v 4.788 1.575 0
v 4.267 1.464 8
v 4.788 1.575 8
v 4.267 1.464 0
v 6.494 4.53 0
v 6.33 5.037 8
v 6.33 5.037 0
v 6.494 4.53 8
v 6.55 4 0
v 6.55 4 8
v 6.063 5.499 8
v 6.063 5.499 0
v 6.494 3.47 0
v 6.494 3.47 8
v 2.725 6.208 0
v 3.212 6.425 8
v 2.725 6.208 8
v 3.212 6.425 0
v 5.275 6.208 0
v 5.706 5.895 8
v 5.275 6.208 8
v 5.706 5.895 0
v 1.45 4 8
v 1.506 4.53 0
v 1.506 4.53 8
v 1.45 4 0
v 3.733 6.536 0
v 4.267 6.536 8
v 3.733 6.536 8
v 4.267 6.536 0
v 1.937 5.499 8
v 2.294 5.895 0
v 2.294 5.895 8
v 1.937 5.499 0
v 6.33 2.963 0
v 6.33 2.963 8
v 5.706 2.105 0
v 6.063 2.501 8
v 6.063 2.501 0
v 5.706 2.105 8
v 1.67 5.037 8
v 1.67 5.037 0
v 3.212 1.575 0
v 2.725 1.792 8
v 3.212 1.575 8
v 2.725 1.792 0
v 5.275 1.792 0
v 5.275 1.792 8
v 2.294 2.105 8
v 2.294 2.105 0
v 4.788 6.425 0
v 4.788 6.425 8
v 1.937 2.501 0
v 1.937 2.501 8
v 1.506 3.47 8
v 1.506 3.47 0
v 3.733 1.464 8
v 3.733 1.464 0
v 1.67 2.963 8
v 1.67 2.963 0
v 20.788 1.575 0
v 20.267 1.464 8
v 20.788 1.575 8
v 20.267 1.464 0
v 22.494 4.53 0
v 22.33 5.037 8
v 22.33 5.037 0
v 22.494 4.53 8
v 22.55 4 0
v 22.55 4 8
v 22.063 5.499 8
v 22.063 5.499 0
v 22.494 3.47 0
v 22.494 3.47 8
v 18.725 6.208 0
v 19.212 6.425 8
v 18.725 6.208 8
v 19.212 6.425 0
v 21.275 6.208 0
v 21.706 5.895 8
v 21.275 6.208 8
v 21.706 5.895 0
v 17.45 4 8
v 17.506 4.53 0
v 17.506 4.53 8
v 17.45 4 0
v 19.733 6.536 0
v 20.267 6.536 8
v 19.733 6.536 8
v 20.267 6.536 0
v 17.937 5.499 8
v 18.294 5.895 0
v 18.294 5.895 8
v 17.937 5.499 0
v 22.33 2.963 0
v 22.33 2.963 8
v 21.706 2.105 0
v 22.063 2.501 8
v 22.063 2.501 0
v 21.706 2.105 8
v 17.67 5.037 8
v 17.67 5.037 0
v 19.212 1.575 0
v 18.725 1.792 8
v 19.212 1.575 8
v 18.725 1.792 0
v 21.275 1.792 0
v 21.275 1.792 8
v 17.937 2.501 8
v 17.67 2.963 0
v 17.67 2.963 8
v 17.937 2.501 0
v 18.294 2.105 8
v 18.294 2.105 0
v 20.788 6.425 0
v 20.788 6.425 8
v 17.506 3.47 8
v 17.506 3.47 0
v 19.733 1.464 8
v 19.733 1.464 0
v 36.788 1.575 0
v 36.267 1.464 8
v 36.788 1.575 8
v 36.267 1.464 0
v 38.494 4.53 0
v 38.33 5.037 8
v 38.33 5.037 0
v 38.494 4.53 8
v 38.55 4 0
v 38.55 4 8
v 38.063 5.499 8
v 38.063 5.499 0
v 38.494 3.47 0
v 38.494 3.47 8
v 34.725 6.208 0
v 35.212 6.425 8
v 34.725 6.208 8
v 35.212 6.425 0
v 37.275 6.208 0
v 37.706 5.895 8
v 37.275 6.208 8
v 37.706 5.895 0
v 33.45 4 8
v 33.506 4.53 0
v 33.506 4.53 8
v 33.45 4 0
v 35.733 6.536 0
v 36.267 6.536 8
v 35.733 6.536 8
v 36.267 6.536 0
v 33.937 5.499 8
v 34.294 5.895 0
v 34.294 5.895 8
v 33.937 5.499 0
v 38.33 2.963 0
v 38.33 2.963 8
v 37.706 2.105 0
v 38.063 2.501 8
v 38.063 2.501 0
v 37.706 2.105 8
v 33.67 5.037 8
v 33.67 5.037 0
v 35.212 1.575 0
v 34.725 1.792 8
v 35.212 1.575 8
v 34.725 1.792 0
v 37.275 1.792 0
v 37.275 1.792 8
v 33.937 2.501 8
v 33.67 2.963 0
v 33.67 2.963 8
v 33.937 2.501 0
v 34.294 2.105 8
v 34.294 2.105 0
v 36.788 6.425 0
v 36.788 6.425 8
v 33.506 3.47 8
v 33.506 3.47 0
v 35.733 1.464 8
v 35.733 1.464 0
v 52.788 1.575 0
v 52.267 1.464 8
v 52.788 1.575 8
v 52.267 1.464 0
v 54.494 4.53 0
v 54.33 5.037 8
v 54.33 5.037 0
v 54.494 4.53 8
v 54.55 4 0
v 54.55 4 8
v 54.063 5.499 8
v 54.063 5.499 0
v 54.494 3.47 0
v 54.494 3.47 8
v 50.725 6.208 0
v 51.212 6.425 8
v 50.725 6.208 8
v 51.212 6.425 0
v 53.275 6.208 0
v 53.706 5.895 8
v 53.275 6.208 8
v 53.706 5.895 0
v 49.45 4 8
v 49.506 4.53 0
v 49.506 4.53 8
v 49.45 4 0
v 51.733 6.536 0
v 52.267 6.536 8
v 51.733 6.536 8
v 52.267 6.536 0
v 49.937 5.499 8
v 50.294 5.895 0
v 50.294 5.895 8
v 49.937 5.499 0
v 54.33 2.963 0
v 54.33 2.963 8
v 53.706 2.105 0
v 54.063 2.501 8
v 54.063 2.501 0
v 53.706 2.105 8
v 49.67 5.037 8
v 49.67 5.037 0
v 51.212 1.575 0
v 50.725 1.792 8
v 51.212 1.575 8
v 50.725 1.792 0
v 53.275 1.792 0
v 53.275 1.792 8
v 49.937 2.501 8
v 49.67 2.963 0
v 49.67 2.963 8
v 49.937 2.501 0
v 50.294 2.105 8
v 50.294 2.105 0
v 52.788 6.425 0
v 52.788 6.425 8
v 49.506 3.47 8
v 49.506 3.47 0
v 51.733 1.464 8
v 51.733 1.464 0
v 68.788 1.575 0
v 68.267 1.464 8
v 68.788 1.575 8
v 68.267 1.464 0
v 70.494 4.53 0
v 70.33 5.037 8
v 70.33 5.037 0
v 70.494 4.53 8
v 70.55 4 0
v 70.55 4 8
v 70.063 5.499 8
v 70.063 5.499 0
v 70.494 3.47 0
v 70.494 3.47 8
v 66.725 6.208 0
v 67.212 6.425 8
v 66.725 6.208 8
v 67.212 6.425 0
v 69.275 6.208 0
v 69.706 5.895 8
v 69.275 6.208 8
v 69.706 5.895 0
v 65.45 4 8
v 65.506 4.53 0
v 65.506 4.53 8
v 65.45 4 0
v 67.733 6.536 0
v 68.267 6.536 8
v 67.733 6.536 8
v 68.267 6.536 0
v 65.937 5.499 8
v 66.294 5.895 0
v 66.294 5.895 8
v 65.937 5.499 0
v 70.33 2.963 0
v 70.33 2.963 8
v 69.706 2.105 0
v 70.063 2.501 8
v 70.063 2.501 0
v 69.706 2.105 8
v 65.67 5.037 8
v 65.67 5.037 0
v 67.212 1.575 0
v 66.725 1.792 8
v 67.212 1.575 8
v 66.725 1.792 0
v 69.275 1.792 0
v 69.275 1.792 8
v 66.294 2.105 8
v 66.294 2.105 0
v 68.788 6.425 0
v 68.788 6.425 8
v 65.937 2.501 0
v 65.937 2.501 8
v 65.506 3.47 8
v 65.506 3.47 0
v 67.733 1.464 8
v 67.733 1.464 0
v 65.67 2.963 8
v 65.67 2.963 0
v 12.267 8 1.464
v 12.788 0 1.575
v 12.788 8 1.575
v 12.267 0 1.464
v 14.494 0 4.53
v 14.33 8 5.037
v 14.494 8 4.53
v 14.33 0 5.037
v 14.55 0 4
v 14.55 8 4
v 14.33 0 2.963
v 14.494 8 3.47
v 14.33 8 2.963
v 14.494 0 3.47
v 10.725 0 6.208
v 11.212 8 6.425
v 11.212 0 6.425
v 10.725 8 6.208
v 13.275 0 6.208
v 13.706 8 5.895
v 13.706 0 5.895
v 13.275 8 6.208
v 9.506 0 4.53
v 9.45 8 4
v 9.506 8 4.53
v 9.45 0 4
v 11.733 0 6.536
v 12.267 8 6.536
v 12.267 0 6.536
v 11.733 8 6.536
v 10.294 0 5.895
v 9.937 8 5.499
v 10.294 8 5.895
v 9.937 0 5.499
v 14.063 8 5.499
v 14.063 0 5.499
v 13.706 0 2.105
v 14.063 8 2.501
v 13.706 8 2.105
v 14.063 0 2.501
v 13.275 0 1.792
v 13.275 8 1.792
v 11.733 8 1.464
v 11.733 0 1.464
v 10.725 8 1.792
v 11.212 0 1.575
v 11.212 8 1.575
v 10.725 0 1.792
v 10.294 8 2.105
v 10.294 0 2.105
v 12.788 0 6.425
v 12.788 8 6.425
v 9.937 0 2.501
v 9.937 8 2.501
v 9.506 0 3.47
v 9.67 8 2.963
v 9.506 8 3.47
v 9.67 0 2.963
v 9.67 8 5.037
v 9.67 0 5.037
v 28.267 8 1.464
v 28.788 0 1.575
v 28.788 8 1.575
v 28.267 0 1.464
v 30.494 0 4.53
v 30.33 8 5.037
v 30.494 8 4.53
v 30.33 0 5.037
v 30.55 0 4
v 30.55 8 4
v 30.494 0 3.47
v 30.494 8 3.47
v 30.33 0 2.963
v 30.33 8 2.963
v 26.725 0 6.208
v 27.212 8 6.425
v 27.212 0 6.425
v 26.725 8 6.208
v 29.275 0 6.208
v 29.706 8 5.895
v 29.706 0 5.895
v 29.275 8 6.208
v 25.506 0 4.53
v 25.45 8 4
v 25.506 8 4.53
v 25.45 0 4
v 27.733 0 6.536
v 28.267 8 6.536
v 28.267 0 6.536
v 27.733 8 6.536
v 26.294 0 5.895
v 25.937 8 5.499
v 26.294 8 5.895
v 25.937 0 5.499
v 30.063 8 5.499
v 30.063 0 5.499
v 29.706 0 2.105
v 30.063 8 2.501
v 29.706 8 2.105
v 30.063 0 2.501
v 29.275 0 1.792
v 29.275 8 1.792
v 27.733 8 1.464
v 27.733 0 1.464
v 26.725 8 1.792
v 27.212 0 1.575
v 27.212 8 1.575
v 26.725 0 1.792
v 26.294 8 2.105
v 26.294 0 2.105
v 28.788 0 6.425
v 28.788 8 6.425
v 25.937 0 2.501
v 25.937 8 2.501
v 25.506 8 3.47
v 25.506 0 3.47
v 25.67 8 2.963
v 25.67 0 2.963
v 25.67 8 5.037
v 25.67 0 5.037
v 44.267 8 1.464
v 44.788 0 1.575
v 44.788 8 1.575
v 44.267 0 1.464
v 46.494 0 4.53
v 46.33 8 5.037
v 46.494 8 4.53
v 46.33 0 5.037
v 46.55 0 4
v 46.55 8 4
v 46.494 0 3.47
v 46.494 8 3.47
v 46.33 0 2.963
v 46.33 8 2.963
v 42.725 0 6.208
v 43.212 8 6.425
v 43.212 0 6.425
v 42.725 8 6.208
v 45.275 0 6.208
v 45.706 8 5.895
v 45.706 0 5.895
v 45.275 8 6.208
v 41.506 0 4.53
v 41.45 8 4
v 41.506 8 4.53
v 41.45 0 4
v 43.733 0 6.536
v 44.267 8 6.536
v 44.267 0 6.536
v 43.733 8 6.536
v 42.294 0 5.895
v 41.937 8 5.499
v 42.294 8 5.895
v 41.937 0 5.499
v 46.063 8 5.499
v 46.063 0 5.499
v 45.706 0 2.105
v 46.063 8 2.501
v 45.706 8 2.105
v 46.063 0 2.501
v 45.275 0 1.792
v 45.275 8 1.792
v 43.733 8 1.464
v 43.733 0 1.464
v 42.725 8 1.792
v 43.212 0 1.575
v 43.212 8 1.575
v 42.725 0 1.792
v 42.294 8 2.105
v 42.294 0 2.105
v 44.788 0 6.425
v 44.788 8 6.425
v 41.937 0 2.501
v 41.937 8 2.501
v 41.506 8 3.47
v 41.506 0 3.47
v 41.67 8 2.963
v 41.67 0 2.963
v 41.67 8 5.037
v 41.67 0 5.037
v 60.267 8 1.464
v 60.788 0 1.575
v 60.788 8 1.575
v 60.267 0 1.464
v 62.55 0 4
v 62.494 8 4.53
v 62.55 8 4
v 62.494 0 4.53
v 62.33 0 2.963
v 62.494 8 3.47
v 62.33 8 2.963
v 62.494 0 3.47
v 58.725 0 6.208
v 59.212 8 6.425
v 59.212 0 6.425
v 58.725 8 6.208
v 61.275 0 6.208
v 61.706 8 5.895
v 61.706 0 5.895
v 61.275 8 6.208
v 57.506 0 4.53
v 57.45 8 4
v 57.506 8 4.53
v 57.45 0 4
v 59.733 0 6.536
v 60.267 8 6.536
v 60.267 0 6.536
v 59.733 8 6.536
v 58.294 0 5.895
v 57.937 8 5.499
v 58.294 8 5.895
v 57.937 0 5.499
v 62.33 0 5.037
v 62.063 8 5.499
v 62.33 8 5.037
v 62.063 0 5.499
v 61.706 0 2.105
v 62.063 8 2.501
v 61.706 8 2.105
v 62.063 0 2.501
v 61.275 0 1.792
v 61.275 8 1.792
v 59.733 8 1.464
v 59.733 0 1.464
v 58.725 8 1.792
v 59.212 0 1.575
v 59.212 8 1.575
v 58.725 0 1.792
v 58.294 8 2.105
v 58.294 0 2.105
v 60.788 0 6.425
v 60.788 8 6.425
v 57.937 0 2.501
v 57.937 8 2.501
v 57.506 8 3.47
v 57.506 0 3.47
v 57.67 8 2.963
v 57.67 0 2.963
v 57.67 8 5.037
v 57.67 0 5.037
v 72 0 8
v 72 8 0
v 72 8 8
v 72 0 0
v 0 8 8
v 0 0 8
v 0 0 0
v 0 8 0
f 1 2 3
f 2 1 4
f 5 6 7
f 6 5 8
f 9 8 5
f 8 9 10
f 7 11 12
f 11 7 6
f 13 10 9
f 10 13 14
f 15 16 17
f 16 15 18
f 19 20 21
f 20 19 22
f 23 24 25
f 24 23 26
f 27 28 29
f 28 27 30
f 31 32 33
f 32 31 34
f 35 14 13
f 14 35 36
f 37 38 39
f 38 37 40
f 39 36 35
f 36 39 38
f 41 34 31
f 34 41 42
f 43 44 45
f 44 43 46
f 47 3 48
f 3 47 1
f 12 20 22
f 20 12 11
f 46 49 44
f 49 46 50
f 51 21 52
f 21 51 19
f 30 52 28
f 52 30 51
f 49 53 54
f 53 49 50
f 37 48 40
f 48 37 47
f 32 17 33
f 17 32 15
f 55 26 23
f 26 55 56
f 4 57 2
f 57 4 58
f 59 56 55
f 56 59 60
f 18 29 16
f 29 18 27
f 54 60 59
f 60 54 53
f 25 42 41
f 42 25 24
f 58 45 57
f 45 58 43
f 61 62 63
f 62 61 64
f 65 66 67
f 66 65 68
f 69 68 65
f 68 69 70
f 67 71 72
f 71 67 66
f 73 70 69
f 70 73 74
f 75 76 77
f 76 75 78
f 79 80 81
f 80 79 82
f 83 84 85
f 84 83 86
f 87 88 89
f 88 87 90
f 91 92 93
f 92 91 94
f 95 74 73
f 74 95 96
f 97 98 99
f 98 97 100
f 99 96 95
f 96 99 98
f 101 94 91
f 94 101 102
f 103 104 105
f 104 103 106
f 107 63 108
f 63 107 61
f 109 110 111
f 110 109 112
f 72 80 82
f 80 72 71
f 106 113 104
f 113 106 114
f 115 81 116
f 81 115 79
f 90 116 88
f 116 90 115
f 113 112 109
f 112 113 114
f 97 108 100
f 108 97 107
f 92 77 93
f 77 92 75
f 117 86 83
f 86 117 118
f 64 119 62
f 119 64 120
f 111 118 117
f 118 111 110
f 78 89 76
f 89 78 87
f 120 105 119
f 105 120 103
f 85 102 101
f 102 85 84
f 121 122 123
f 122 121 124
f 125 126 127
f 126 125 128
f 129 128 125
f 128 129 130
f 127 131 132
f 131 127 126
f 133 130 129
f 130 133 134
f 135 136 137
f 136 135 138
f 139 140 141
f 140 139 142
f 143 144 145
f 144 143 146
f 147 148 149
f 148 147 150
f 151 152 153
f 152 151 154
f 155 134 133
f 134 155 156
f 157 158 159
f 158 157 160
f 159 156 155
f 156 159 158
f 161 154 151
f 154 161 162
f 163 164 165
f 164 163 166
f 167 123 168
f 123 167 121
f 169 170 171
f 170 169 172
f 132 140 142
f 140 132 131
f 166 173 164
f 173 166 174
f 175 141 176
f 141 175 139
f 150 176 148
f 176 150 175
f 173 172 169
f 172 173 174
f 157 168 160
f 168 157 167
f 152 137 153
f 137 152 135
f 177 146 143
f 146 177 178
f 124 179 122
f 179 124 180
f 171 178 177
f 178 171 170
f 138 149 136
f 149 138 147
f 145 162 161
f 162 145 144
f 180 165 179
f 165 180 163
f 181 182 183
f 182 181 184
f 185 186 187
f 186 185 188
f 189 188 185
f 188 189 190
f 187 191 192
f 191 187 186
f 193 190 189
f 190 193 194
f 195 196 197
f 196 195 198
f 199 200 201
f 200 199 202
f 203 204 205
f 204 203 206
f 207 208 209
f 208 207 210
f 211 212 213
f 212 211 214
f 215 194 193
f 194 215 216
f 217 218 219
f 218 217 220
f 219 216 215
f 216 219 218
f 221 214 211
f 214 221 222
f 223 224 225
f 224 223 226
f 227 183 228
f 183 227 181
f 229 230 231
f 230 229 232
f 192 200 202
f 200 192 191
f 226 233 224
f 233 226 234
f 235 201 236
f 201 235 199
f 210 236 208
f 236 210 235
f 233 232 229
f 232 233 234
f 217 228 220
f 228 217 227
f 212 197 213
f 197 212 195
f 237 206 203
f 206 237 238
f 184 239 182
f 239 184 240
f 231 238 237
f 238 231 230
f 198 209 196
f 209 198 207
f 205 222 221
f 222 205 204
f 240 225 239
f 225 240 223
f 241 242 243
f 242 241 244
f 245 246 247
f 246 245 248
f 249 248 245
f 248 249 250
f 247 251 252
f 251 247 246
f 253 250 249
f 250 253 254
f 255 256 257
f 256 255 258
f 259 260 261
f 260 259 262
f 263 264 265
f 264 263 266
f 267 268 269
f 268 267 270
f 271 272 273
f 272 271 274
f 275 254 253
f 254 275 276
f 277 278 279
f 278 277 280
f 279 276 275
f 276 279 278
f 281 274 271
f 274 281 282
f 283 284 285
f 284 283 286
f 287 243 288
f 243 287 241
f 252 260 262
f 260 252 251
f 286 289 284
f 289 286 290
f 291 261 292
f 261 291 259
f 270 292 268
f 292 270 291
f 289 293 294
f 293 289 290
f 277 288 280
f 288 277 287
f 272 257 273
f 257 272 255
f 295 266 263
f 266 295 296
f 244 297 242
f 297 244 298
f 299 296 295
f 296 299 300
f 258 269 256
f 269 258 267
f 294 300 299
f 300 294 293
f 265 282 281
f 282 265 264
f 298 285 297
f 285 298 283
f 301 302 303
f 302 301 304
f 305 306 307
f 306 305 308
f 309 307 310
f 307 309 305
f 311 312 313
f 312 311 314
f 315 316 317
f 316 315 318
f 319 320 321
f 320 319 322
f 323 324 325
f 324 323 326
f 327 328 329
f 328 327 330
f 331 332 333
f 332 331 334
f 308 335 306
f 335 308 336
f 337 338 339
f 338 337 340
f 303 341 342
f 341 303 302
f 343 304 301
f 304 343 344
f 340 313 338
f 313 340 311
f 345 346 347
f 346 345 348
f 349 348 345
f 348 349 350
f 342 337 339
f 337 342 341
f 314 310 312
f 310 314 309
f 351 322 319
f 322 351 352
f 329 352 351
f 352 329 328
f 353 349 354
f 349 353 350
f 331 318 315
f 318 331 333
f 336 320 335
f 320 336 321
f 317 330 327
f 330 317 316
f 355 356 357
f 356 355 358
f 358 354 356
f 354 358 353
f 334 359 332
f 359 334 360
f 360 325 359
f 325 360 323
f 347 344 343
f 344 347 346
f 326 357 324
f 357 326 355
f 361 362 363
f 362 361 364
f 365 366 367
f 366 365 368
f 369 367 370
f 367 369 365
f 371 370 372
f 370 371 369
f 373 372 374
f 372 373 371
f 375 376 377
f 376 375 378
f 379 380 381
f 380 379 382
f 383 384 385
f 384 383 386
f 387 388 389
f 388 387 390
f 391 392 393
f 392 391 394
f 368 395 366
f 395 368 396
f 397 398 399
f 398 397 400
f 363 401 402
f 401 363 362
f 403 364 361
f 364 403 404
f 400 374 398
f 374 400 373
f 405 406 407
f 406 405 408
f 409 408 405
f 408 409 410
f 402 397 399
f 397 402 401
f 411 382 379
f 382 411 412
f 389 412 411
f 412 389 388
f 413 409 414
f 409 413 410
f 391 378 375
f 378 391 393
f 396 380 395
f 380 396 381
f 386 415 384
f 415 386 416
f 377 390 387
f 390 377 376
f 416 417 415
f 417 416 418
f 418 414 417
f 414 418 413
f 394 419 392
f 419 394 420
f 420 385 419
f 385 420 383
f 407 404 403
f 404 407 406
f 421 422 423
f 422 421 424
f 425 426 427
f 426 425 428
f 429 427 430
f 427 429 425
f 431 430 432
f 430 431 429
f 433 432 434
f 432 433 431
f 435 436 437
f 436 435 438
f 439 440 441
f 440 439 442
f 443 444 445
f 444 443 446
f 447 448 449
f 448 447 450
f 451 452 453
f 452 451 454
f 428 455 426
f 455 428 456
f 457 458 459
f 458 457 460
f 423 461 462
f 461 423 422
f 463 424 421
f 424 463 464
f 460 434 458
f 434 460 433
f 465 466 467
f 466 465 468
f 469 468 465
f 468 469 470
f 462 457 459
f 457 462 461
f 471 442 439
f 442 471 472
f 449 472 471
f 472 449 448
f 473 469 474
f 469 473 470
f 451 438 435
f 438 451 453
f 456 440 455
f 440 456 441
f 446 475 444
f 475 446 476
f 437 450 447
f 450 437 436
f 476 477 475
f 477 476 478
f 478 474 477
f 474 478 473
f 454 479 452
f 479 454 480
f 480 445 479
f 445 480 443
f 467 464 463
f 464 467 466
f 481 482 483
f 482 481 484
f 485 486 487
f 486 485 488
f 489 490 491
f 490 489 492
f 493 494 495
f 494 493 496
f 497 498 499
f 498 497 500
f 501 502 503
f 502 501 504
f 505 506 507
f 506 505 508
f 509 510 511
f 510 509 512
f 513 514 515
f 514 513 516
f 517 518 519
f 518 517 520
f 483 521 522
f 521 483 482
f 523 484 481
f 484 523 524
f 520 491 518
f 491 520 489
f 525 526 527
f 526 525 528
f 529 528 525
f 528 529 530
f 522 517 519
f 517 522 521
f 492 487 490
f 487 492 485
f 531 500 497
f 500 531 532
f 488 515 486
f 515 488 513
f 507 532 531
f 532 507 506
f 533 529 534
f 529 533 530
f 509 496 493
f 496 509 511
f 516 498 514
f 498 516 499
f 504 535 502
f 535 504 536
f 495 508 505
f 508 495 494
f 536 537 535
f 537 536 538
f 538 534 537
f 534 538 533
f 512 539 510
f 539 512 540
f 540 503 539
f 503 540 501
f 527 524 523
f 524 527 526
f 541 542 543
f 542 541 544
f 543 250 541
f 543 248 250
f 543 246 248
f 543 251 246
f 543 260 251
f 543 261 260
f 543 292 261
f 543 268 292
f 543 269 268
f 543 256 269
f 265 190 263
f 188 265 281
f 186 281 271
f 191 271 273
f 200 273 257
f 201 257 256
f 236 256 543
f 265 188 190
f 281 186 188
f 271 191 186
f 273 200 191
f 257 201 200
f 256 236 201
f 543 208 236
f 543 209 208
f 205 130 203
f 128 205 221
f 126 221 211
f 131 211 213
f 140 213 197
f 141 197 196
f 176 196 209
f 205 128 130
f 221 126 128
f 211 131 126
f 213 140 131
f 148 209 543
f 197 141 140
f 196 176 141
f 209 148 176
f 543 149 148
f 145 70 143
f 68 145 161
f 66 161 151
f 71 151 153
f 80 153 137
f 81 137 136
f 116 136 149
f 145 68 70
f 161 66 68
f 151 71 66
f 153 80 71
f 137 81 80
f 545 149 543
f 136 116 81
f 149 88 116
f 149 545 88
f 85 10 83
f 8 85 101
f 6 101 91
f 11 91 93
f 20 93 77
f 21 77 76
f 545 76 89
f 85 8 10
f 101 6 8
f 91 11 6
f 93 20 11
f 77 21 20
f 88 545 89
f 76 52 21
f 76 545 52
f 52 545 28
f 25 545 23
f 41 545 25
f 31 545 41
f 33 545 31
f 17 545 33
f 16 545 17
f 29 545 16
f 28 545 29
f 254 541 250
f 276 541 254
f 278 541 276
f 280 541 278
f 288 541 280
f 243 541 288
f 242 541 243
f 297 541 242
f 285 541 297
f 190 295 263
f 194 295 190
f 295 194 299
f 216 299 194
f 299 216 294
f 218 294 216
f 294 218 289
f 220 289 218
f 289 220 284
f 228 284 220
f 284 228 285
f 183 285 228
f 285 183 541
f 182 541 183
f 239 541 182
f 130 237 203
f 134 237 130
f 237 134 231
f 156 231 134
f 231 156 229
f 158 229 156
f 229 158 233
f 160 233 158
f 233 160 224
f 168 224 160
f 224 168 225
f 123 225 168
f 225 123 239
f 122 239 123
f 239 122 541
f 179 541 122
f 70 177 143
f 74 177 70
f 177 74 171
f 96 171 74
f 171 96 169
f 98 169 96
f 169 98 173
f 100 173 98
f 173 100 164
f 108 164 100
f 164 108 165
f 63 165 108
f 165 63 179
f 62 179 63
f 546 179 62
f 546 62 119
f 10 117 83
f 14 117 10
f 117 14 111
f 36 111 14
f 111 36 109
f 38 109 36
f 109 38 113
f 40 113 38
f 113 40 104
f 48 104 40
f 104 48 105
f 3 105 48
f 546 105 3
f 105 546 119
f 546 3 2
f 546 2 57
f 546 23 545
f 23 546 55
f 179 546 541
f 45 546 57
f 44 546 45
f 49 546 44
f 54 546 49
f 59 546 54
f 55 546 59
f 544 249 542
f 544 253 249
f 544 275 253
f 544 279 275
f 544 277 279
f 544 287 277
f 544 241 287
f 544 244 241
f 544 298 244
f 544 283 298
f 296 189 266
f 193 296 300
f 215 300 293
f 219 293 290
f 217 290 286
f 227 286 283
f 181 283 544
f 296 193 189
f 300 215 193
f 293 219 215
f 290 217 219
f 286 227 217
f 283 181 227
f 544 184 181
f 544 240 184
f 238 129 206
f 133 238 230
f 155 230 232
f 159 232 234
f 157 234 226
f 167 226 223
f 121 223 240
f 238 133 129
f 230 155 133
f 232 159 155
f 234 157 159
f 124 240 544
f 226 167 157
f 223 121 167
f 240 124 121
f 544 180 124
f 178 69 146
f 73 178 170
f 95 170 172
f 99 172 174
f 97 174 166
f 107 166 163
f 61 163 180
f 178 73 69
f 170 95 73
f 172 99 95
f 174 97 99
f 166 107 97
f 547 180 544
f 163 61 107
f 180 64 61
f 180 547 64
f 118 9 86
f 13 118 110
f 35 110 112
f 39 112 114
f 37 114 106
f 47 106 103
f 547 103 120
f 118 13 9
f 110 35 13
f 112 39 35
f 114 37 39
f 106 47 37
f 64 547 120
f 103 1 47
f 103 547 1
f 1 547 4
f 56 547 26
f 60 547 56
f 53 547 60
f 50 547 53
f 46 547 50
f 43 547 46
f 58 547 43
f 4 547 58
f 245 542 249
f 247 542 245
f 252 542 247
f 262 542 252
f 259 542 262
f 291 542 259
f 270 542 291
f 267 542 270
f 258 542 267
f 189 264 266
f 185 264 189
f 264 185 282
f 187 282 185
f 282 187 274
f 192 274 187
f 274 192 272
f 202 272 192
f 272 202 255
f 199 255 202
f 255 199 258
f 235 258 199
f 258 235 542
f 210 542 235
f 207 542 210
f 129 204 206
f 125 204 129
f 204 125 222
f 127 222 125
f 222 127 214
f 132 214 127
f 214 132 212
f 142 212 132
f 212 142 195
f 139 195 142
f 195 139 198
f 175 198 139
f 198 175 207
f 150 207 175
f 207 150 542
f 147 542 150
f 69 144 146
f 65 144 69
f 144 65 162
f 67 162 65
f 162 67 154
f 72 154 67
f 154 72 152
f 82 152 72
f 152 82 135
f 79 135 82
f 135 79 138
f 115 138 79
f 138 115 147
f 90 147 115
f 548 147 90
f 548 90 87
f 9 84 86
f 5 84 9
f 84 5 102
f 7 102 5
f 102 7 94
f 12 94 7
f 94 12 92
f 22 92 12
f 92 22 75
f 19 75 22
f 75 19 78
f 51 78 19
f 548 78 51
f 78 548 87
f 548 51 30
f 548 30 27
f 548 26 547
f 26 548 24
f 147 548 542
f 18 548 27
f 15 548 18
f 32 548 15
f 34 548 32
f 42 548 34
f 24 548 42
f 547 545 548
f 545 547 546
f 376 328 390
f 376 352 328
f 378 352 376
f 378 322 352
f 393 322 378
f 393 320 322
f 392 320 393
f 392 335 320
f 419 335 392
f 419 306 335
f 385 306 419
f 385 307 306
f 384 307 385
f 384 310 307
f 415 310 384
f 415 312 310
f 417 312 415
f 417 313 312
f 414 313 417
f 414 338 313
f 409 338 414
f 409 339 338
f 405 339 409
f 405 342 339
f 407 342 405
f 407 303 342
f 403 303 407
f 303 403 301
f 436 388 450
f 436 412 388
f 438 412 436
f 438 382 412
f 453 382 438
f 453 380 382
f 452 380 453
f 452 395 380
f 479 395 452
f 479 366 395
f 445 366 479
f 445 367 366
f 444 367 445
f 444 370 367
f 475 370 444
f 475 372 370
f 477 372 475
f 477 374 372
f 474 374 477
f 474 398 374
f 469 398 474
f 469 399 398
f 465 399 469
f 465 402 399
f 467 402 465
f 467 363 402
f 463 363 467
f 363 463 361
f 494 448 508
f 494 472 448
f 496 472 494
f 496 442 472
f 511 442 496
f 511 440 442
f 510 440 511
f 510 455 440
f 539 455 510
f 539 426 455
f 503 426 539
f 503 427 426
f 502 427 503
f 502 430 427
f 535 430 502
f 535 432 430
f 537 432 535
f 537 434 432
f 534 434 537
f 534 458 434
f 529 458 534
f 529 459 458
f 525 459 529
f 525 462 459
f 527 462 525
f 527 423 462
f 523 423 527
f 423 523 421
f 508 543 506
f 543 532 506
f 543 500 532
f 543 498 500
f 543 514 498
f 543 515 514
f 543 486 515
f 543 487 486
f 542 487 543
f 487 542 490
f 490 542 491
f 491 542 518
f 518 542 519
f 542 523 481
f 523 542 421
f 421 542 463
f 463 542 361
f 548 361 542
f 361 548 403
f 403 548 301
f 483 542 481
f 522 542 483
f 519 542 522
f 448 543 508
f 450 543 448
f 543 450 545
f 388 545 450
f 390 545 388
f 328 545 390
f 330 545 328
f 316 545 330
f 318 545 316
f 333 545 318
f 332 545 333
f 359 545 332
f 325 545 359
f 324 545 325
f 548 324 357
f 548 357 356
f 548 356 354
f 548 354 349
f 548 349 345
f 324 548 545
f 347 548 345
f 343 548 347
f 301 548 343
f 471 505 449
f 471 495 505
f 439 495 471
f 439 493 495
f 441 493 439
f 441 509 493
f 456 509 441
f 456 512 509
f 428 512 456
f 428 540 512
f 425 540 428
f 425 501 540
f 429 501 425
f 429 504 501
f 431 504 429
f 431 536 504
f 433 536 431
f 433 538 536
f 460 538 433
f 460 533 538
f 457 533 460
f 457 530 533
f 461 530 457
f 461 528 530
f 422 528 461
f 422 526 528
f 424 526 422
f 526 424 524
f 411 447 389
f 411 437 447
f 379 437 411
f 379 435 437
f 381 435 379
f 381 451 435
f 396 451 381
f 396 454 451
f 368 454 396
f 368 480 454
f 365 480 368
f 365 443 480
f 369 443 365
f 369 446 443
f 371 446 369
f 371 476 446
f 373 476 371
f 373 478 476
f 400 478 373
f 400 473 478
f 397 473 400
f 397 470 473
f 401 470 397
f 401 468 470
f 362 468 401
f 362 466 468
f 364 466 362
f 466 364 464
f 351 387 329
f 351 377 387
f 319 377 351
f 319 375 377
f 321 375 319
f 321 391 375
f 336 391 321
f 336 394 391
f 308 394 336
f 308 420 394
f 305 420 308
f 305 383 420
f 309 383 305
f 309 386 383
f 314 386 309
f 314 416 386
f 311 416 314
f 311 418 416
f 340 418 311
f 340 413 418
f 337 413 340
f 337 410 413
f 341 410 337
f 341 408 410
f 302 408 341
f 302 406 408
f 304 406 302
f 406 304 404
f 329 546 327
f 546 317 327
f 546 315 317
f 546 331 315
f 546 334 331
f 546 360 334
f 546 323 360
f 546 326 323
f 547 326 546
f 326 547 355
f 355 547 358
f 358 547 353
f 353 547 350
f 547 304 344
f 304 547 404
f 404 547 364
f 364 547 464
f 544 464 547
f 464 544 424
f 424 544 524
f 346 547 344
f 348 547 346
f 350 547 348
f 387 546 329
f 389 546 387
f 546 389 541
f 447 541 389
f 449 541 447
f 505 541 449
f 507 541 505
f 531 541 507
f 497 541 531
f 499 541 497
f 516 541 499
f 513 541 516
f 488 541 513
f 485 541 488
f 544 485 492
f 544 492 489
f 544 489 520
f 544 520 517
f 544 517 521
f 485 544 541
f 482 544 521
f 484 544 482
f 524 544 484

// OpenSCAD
// Description: "LEGO Technic-compatible gridbeam"
// Project home: http://bitbeam.org

// Each bitbeam is 8mm inches wide. 
// Center of each hole is 8mm apart from each other
// Holes are 5.1 mm in diameter.

// Mini
//beam_width     = 4;
//hole_diameter  = 2.2;

// Standard
beam_width     = 8;
hole_diameter  = 5.1;

hole_radius    = hole_diameter / 2;

module beam(number_of_holes) {
    beam_length = number_of_holes * beam_width;
    difference() {
        // Draw the beam...
        cube([beam_length,beam_width,beam_width]);
    
        // Cut the holes...
        for (x=[beam_width/2 : beam_width*2 : beam_length]) {
            translate([x,beam_width/2,-2])
            cylinder(r=hole_radius, h=beam_width*1.5, $fn=30);
        }
        for (x=[beam_width/2 + beam_width : beam_width*2 : beam_length]) {
            rotate([90,0,0])
            translate([x,beam_width/2,-beam_width*1.5])
            cylinder(r=hole_radius, h=beam_width*2, $fn=30);
        }

        // Optional through-hole
        //rotate([0,90,0])
        //translate([-beam_width/2,beam_width/2,-2])
        //cylinder(r=hole_radius, h=number_of_holes*beam_width+4, $fn=30);
    }
}

beam(9);
